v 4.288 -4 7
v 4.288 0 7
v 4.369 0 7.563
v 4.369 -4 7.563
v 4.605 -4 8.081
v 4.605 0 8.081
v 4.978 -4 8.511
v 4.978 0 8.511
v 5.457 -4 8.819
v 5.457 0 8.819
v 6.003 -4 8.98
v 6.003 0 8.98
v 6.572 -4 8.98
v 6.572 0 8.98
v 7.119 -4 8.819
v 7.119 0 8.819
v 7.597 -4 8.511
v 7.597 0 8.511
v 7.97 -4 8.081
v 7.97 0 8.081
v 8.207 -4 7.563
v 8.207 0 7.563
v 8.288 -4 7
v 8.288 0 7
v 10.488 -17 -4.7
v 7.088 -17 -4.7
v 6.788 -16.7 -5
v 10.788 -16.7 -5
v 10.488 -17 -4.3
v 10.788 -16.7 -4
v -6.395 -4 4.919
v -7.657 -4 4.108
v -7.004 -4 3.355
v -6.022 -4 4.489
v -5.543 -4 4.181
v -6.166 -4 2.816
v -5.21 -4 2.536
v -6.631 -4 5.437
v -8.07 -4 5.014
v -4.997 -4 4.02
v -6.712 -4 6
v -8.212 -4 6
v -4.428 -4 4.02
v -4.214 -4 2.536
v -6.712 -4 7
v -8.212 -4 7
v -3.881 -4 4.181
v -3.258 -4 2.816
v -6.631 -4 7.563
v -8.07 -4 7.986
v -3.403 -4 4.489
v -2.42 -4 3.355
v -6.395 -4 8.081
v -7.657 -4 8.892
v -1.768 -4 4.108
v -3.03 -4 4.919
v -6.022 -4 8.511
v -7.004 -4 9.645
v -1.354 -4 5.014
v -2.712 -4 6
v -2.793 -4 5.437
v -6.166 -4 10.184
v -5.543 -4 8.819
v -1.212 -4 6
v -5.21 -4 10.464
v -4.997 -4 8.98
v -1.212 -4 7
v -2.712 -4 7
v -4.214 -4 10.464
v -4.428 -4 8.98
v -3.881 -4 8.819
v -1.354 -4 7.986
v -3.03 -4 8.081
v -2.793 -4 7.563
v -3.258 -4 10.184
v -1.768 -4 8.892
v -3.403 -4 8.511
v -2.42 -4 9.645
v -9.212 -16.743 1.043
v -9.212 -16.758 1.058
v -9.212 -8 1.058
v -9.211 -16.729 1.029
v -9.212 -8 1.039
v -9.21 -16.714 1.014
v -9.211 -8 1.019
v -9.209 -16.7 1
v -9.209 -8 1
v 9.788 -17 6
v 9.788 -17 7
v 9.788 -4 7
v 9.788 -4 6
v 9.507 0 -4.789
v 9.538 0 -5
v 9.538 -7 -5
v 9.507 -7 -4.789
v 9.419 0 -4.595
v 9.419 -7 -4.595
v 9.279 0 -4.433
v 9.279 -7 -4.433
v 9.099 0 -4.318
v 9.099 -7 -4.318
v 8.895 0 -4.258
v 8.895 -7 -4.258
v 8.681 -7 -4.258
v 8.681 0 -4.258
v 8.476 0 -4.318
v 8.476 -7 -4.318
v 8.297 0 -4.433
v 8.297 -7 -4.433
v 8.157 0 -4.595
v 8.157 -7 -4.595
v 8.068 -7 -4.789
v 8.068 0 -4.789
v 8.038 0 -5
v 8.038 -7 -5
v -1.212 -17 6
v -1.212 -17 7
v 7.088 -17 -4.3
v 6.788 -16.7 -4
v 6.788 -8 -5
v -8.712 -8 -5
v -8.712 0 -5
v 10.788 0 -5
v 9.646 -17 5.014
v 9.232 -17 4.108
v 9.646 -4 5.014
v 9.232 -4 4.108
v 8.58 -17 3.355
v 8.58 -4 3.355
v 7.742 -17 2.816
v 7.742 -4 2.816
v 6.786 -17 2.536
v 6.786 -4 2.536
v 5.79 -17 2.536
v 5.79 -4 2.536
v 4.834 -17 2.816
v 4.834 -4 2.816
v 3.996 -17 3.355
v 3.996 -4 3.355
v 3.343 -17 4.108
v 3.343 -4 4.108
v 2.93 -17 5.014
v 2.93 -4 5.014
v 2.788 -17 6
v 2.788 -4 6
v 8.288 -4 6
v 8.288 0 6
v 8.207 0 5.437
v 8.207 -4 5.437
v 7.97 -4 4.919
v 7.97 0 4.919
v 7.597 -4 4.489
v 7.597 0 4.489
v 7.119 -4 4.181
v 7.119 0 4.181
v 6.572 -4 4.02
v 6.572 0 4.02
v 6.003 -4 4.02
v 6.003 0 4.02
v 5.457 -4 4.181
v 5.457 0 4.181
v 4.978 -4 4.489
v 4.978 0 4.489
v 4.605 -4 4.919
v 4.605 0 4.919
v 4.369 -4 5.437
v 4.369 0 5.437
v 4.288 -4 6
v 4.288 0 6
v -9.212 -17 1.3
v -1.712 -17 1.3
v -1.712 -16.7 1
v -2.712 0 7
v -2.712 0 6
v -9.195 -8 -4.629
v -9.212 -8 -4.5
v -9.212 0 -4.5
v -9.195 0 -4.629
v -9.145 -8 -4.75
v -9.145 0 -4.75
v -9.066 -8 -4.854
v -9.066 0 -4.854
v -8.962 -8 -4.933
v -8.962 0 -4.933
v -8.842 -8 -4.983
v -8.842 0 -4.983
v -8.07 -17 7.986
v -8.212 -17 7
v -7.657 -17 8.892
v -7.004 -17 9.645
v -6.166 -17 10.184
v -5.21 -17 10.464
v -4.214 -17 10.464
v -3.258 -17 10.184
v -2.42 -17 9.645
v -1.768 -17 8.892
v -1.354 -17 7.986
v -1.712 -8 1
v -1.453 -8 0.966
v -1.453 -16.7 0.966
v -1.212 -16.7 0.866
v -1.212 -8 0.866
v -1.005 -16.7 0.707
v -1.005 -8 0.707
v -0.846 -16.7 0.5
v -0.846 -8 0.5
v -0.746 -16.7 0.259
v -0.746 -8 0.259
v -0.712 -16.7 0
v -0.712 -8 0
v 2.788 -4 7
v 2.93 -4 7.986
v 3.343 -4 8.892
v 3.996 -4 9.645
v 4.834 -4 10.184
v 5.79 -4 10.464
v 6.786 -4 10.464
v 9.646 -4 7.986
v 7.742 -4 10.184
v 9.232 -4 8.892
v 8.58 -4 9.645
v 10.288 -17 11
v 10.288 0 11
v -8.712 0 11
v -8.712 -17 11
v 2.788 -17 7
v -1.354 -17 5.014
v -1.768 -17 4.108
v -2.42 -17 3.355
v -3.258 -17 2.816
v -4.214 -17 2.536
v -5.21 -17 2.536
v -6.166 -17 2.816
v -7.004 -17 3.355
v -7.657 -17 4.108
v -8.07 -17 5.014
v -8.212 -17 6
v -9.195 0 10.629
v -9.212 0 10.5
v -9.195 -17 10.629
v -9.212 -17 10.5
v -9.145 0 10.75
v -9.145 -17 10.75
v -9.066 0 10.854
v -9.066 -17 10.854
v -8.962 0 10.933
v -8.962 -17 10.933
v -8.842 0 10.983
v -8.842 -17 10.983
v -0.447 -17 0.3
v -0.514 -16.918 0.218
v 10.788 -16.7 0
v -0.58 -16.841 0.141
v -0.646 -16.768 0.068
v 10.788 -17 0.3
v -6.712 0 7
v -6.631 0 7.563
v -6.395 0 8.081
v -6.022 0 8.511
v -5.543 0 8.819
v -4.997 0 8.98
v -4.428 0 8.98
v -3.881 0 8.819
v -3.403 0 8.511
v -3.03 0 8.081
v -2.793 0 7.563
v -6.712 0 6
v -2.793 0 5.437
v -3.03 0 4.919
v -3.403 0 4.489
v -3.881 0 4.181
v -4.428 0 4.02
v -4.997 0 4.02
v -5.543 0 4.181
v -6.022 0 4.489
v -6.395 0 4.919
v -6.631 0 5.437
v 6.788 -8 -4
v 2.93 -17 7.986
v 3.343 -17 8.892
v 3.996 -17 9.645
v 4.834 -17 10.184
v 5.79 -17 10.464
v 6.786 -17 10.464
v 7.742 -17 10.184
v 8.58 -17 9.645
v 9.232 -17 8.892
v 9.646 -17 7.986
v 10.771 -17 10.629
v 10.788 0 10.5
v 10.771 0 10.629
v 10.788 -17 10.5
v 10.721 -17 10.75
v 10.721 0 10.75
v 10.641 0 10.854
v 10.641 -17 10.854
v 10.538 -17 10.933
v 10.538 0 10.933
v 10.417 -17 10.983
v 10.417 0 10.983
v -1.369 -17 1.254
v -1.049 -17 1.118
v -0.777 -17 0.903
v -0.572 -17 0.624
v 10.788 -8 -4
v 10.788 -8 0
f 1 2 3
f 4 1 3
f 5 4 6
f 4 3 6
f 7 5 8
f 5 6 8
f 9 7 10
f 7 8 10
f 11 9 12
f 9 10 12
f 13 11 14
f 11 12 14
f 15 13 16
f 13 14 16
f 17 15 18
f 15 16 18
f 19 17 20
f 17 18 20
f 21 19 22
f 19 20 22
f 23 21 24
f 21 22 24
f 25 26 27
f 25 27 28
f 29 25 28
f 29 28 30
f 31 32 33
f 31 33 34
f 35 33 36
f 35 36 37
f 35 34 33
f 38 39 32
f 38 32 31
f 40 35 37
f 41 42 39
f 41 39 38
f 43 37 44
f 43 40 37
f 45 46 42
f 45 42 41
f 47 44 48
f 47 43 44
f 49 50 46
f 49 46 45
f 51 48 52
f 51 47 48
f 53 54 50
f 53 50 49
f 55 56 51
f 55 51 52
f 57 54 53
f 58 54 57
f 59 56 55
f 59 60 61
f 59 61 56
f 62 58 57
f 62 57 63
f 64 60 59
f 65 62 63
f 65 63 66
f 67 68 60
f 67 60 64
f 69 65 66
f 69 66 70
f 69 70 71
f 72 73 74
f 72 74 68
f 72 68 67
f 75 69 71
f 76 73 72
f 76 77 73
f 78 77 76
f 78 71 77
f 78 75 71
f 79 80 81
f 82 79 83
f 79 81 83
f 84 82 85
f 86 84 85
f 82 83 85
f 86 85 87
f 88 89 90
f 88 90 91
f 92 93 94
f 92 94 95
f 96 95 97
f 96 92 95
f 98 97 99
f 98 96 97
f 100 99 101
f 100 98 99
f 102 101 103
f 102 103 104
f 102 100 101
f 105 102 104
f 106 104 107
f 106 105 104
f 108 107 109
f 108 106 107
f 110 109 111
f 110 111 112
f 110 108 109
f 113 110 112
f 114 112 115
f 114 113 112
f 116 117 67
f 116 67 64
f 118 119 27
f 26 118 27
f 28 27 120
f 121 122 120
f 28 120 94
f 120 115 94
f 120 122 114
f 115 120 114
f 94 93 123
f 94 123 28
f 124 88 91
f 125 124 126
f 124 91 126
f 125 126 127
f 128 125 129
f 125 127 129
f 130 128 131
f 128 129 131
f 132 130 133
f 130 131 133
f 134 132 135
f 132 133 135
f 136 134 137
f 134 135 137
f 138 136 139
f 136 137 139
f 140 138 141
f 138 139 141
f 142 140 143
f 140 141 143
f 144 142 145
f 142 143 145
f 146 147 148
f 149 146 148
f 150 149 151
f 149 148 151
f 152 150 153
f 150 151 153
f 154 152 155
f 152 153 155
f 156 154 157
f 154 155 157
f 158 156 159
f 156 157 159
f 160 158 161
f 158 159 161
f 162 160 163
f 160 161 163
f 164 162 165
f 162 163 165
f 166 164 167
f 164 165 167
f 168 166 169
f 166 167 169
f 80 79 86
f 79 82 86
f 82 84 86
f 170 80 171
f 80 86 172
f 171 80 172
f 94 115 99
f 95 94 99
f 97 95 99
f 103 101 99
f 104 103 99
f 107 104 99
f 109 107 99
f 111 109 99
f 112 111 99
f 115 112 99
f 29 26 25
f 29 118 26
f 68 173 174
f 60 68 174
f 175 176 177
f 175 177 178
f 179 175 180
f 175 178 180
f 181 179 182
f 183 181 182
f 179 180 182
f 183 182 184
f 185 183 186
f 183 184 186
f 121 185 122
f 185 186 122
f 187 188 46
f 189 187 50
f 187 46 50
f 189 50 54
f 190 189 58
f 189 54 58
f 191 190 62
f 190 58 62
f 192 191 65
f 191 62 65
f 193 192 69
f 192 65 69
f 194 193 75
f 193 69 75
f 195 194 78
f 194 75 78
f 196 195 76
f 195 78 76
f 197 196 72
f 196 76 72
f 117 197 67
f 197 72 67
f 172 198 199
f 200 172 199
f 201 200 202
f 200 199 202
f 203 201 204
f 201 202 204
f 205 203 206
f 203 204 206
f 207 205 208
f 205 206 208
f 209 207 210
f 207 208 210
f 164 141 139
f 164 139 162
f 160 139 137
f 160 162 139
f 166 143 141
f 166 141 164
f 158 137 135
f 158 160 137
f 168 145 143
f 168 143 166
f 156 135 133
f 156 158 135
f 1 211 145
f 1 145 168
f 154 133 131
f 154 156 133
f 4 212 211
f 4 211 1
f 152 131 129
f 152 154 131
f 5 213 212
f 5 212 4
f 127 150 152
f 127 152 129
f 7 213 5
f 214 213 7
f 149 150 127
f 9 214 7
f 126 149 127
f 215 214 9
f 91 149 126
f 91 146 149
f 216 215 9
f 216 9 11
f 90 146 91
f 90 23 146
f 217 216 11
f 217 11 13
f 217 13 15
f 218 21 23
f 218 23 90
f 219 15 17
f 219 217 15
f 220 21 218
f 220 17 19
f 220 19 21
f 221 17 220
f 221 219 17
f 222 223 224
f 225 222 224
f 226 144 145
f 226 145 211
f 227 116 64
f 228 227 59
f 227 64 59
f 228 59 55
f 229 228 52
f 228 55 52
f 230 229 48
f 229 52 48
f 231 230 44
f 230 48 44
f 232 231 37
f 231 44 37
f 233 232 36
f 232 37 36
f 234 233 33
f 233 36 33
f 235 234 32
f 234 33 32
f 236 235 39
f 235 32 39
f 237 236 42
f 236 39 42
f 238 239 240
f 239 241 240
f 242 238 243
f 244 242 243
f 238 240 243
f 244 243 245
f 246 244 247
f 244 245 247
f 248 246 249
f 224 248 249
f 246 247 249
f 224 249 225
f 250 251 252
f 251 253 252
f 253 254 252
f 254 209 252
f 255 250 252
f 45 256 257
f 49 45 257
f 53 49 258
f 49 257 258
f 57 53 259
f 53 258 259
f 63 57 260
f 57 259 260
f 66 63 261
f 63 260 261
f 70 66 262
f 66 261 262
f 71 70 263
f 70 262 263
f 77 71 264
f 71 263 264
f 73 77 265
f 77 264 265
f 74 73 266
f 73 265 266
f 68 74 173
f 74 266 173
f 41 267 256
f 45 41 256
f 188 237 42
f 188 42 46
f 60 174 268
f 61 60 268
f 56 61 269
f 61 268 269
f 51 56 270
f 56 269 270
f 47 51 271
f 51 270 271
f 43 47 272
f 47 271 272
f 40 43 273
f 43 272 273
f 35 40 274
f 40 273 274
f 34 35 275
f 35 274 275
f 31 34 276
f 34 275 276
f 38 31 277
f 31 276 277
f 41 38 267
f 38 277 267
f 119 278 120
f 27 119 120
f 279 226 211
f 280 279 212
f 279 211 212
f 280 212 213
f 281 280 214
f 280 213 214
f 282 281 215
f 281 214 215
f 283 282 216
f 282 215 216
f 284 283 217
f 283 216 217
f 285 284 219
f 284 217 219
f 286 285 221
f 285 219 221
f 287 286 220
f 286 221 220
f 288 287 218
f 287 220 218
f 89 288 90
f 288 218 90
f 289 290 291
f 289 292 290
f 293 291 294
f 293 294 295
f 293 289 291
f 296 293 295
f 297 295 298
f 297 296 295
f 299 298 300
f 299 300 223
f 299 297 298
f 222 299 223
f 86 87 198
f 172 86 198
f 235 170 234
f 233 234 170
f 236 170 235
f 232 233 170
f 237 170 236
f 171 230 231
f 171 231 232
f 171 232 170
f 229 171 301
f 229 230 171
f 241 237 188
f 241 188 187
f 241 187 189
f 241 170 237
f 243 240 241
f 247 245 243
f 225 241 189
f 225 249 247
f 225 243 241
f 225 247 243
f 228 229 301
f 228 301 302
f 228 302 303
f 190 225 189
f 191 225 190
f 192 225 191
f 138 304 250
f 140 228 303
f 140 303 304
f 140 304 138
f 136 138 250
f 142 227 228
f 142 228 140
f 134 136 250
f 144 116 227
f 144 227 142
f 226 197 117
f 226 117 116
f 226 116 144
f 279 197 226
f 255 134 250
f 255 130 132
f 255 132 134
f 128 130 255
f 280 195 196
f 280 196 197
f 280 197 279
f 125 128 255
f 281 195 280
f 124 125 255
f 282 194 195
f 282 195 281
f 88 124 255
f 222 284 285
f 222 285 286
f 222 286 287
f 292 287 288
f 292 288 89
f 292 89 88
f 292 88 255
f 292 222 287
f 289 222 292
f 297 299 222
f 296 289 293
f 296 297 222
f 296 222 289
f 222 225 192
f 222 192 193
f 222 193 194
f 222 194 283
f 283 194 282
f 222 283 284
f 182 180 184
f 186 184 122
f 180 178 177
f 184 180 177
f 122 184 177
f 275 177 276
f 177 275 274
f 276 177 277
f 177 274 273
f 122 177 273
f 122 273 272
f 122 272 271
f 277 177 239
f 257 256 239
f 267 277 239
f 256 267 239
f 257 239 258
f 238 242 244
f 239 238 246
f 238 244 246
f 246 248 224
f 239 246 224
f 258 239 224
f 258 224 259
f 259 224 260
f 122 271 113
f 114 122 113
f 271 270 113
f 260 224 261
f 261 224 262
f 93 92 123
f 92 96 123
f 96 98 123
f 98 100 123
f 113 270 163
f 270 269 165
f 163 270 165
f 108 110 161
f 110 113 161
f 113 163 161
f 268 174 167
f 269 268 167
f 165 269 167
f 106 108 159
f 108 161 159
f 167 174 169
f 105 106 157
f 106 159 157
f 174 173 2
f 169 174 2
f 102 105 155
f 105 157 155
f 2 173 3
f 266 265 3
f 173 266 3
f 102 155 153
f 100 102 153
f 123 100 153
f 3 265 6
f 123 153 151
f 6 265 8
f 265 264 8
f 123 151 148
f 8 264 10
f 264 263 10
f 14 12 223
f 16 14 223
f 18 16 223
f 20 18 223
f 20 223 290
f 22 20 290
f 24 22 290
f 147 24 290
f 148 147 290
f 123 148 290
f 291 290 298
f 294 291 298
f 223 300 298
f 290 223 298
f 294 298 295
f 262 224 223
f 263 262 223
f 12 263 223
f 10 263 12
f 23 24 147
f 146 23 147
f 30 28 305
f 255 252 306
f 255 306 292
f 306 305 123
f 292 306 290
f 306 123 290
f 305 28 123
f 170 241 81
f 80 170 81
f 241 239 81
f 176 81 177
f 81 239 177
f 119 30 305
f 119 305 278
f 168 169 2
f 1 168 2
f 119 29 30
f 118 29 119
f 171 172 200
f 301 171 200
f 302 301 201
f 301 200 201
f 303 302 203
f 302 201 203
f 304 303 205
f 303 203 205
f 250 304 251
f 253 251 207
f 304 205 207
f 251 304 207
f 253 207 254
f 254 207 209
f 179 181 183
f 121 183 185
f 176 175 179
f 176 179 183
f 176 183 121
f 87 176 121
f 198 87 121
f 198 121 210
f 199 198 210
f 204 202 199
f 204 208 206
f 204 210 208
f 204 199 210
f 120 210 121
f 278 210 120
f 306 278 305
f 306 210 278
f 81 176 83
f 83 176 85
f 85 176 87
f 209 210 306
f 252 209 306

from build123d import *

# Parameters (mm, degrees)
F1_DEPTH = 17
F2_DEPTH = 8
F3_DEPTH = 17
F4_R     = 0.5
F5_DEPTH = 4
F6_SIZE  = 0.3
F7_DEPTH = 7
F8_DEPTH = 4


with BuildPart() as f1:
    # F0 (on Front) → F1 (new body)
    with BuildSketch(Plane.XZ):
        with BuildLine():
            Line((10.7877647579, 0), (10.7877647579, 11))
            Line((10.7877647579, 11), (-9.2122352421, 11))
            Line((-9.2122352421, 11), (-9.2122352421, 1.0579130137))
            ThreePointArc((-9.2122352421, 1.0579130137), (-9.2113932226, 1.0289076607), (-9.2088700001, 1))
            Line((-9.2088700001, 1), (-1.7122352421, 1))
            ThreePointArc((-1.7122352421, 1), (-1.0051284609, 0.7071067812), (-0.7122352421, 0))
            Line((-0.7122352421, 0), (0, 0))
            Line((0, 0), (10.7877647579, 0))
        make_face()
        with BuildLine():
            Line((-8.2122352421, 6), (-8.2122352421, 7))
            ThreePointArc((-8.2122352421, 7), (-4.7122352421, 10.5), (-1.2122352421, 7))
            Line((-1.2122352421, 7), (-1.2122352421, 6))
            ThreePointArc((-1.2122352421, 6), (-4.7122352421, 2.5), (-8.2122352421, 6))
        make_face(mode=Mode.SUBTRACT)
        with BuildLine():
            ThreePointArc((2.7877647579, 7), (6.2877647579, 10.5), (9.7877647579, 7))
            Line((9.7877647579, 7), (9.7877647579, 6))
            ThreePointArc((9.7877647579, 6), (6.2877647579, 2.5), (2.7877647579, 6))
            Line((2.7877647579, 6), (2.7877647579, 7))
        make_face(mode=Mode.SUBTRACT)
    extrude(amount=F1_DEPTH)

    # F0 (on Front) → F2 (join)
    with BuildSketch(Plane.XZ):
        with BuildLine():
            Line((10.7877647579, 0), (10.7877647579, 11))
            Line((10.7877647579, 11), (-9.2122352421, 11))
            Line((-9.2122352421, 11), (-9.2122352421, 1.0579130137))
            ThreePointArc((-9.2122352421, 1.0579130137), (-9.2113932226, 1.0289076607), (-9.2088700001, 1))
            Line((-9.2088700001, 1), (-1.7122352421, 1))
            ThreePointArc((-1.7122352421, 1), (-1.0051284609, 0.7071067812), (-0.7122352421, 0))
            Line((-0.7122352421, 0), (0, 0))
            Line((0, 0), (10.7877647579, 0))
        make_face()
        with BuildLine():
            Line((-8.2122352421, 6), (-8.2122352421, 7))
            ThreePointArc((-8.2122352421, 7), (-4.7122352421, 10.5), (-1.2122352421, 7))
            Line((-1.2122352421, 7), (-1.2122352421, 6))
            ThreePointArc((-1.2122352421, 6), (-4.7122352421, 2.5), (-8.2122352421, 6))
        make_face(mode=Mode.SUBTRACT)
        with BuildLine():
            ThreePointArc((2.7877647579, 7), (6.2877647579, 10.5), (9.7877647579, 7))
            Line((9.7877647579, 7), (9.7877647579, 6))
            ThreePointArc((9.7877647579, 6), (6.2877647579, 2.5), (2.7877647579, 6))
            Line((2.7877647579, 6), (2.7877647579, 7))
        make_face(mode=Mode.SUBTRACT)
        with BuildLine():
            Line((10.7877647579, -4), (10.7877647579, 0))
            Line((10.7877647579, 0), (0, 0))
            Line((0, 0), (-0.7122352421, 0))
            ThreePointArc((-0.7122352421, 0), (-1.0051284609, 0.7071067812), (-1.7122352421, 1))
            Line((-1.7122352421, 1), (-9.2088700001, 1))
            ThreePointArc((-9.2088700001, 1), (-9.2113932226, 1.0289076607), (-9.2122352421, 1.0579130137))
            Line((-9.2122352421, 1.0579130137), (-9.2122352421, -4.5))
            ThreePointArc((-9.2122352421, -4.5), (-9.0657886327, -4.8535533906), (-8.7122352421, -5))
            Line((-8.7122352421, -5), (6.7877647579, -5))
            Line((6.7877647579, -5), (6.7877647579, -4))
            Line((6.7877647579, -4), (10.7877647579, -4))
        make_face()
    extrude(amount=F2_DEPTH)

    # F0 (on Front) → F3 (join)
    with BuildSketch(Plane.XZ):
        with BuildLine():
            Line((10.7877647579, -5), (10.7877647579, -4))
            Line((10.7877647579, -4), (6.7877647579, -4))
            Line((6.7877647579, -4), (6.7877647579, -5))
            Line((6.7877647579, -5), (8.0377647579, -5))
            ThreePointArc((8.0377647579, -5), (8.7877647579, -4.25), (9.5377647579, -5))
            Line((9.5377647579, -5), (10.7877647579, -5))
        make_face()
        with BuildLine():
            Line((8.0377647579, -5), (9.5377647579, -5))
            ThreePointArc((9.5377647579, -5), (8.7877647579, -4.25), (8.0377647579, -5))
        make_face()
    extrude(amount=F3_DEPTH)

    # F4
    f4_edges = [f1.edges().sort_by_distance(p)[0] for p in [
        (-9.212235, -8.5, 11),
        (10.787765, -8.5, 11),
    ]]
    fillet(f4_edges, radius=F4_R)

    # F0 (on Front) → F5 (join)
    with BuildSketch(Plane.XZ):
        with BuildLine():
            Line((9.7877647579, 6), (9.7877647579, 7))
            ThreePointArc((9.7877647579, 7), (6.2877647579, 10.5), (2.7877647579, 7))
            Line((2.7877647579, 7), (2.7877647579, 6))
            ThreePointArc((2.7877647579, 6), (6.2877647579, 2.5), (9.7877647579, 6))
        make_face()
        with BuildLine():
            ThreePointArc((4.2877647579, 7), (6.2877647579, 9), (8.2877647579, 7))
            Line((8.2877647579, 7), (8.2877647579, 6))
            ThreePointArc((8.2877647579, 6), (6.2877647579, 4), (4.2877647579, 6))
            Line((4.2877647579, 6), (4.2877647579, 7))
        make_face(mode=Mode.SUBTRACT)
    extrude(amount=F5_DEPTH)

    # F6
    f6_edges = [f1.edges().sort_by_distance(p)[0] for p in [
        (-5.460553, -17, 1),
        (-1.005128, -17, 0.707107),
        (5.037765, -17, 0),
        (8.787765, -17, -5),
        (6.787765, -17, -4.5),
        (8.787765, -17, -4),
        (10.787765, -17, -4.5),
    ]]
    chamfer(f6_edges, length=F6_SIZE)

    # F0 (on Front) → F7 (cut)
    with BuildSketch(Plane.XZ):
        with BuildLine():
            Line((8.0377647579, -5), (9.5377647579, -5))
            ThreePointArc((9.5377647579, -5), (8.7877647579, -4.25), (8.0377647579, -5))
        make_face()
    extrude(amount=F7_DEPTH, mode=Mode.SUBTRACT)

    # F0 (on Front) → F8 (join)
    with BuildSketch(Plane.XZ):
        with BuildLine():
            ThreePointArc((-1.2122352421, 7), (-4.7122352421, 10.5), (-8.2122352421, 7))
            Line((-8.2122352421, 7), (-8.2122352421, 6))
            ThreePointArc((-8.2122352421, 6), (-4.7122352421, 2.5), (-1.2122352421, 6))
            Line((-1.2122352421, 6), (-1.2122352421, 7))
        make_face()
        with BuildLine():
            Line((-2.7122352421, 7), (-2.7122352421, 6))
            ThreePointArc((-2.7122352421, 6), (-4.7122352421, 4), (-6.7122352421, 6))
            Line((-6.7122352421, 6), (-6.7122352421, 7))
            ThreePointArc((-6.7122352421, 7), (-4.7122352421, 9), (-2.7122352421, 7))
        make_face(mode=Mode.SUBTRACT)
    extrude(amount=F8_DEPTH)


solid = f1.part
